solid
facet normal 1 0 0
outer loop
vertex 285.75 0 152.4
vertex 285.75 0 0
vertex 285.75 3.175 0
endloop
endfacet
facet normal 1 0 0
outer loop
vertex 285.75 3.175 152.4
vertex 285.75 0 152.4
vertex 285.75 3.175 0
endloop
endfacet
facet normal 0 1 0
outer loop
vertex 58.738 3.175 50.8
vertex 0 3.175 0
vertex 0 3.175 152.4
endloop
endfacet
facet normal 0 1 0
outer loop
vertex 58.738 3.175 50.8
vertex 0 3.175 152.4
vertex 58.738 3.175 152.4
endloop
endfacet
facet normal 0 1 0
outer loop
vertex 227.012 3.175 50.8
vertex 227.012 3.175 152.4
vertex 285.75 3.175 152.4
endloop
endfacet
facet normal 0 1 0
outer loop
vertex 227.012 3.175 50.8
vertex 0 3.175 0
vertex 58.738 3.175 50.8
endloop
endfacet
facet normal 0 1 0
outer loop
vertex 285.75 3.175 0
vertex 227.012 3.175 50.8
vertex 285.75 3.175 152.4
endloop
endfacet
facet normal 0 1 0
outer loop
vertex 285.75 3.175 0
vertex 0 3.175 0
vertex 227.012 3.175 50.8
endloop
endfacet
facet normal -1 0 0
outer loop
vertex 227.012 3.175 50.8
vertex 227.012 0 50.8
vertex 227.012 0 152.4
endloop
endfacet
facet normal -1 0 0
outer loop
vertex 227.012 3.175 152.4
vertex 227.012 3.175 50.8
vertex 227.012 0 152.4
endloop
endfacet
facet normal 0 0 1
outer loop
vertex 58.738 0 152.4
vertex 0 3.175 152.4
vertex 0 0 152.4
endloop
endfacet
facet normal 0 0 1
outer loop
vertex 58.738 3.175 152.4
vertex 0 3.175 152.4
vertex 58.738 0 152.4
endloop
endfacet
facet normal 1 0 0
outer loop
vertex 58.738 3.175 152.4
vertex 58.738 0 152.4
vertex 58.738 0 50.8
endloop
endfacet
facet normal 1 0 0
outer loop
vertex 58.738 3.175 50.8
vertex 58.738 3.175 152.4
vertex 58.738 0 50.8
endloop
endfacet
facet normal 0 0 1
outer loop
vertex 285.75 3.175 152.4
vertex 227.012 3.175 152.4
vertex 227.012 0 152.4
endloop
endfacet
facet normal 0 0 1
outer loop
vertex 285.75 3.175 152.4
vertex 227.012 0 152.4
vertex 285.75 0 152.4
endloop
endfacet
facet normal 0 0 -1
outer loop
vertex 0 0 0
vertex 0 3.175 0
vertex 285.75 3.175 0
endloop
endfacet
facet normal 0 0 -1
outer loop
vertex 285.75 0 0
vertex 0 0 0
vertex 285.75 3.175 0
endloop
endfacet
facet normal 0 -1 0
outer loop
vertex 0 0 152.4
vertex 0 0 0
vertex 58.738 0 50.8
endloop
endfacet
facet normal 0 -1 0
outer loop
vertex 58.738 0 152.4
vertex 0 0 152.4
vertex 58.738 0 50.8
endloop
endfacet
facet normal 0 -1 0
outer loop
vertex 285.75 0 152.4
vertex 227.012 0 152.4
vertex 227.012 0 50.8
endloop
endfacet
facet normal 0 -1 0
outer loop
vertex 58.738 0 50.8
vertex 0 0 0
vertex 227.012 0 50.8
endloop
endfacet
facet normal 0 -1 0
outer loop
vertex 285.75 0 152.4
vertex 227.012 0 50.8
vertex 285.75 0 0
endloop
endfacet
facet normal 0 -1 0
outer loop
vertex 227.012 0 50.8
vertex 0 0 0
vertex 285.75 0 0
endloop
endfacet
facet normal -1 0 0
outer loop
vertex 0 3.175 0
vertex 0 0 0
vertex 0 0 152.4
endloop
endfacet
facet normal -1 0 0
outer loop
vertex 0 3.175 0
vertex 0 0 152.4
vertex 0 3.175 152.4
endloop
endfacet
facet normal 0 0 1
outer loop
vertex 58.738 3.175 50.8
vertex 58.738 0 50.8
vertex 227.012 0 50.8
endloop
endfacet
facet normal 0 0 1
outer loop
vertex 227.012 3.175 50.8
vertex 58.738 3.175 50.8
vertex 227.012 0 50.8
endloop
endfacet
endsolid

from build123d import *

# Parameters (mm, degrees)
F0_W     = 285.75
F0_H     = 3.175
F1_DEPTH = 152.4
F3_DEPTH = 25.4


with BuildPart() as f1:
    # F0 (on Top) → F1 (new body)
    with BuildSketch(Plane.XY):
        with Locations((142.875, 1.5875)):
            Rectangle(F0_W, F0_H)
    extrude(amount=F1_DEPTH)

    # F2 (on face) → F3 (cut)
    with BuildSketch(Plane.XZ):
        Polygon((58.7375, 50.8), (142.875, 50.8), (227.0125, 50.8), (227.0125, 76.2), (227.0125, 152.4), (58.7375, 152.4), (58.7375, 76.2), align=None)
    extrude(amount=-F3_DEPTH, mode=Mode.SUBTRACT)


solid = f1.part
